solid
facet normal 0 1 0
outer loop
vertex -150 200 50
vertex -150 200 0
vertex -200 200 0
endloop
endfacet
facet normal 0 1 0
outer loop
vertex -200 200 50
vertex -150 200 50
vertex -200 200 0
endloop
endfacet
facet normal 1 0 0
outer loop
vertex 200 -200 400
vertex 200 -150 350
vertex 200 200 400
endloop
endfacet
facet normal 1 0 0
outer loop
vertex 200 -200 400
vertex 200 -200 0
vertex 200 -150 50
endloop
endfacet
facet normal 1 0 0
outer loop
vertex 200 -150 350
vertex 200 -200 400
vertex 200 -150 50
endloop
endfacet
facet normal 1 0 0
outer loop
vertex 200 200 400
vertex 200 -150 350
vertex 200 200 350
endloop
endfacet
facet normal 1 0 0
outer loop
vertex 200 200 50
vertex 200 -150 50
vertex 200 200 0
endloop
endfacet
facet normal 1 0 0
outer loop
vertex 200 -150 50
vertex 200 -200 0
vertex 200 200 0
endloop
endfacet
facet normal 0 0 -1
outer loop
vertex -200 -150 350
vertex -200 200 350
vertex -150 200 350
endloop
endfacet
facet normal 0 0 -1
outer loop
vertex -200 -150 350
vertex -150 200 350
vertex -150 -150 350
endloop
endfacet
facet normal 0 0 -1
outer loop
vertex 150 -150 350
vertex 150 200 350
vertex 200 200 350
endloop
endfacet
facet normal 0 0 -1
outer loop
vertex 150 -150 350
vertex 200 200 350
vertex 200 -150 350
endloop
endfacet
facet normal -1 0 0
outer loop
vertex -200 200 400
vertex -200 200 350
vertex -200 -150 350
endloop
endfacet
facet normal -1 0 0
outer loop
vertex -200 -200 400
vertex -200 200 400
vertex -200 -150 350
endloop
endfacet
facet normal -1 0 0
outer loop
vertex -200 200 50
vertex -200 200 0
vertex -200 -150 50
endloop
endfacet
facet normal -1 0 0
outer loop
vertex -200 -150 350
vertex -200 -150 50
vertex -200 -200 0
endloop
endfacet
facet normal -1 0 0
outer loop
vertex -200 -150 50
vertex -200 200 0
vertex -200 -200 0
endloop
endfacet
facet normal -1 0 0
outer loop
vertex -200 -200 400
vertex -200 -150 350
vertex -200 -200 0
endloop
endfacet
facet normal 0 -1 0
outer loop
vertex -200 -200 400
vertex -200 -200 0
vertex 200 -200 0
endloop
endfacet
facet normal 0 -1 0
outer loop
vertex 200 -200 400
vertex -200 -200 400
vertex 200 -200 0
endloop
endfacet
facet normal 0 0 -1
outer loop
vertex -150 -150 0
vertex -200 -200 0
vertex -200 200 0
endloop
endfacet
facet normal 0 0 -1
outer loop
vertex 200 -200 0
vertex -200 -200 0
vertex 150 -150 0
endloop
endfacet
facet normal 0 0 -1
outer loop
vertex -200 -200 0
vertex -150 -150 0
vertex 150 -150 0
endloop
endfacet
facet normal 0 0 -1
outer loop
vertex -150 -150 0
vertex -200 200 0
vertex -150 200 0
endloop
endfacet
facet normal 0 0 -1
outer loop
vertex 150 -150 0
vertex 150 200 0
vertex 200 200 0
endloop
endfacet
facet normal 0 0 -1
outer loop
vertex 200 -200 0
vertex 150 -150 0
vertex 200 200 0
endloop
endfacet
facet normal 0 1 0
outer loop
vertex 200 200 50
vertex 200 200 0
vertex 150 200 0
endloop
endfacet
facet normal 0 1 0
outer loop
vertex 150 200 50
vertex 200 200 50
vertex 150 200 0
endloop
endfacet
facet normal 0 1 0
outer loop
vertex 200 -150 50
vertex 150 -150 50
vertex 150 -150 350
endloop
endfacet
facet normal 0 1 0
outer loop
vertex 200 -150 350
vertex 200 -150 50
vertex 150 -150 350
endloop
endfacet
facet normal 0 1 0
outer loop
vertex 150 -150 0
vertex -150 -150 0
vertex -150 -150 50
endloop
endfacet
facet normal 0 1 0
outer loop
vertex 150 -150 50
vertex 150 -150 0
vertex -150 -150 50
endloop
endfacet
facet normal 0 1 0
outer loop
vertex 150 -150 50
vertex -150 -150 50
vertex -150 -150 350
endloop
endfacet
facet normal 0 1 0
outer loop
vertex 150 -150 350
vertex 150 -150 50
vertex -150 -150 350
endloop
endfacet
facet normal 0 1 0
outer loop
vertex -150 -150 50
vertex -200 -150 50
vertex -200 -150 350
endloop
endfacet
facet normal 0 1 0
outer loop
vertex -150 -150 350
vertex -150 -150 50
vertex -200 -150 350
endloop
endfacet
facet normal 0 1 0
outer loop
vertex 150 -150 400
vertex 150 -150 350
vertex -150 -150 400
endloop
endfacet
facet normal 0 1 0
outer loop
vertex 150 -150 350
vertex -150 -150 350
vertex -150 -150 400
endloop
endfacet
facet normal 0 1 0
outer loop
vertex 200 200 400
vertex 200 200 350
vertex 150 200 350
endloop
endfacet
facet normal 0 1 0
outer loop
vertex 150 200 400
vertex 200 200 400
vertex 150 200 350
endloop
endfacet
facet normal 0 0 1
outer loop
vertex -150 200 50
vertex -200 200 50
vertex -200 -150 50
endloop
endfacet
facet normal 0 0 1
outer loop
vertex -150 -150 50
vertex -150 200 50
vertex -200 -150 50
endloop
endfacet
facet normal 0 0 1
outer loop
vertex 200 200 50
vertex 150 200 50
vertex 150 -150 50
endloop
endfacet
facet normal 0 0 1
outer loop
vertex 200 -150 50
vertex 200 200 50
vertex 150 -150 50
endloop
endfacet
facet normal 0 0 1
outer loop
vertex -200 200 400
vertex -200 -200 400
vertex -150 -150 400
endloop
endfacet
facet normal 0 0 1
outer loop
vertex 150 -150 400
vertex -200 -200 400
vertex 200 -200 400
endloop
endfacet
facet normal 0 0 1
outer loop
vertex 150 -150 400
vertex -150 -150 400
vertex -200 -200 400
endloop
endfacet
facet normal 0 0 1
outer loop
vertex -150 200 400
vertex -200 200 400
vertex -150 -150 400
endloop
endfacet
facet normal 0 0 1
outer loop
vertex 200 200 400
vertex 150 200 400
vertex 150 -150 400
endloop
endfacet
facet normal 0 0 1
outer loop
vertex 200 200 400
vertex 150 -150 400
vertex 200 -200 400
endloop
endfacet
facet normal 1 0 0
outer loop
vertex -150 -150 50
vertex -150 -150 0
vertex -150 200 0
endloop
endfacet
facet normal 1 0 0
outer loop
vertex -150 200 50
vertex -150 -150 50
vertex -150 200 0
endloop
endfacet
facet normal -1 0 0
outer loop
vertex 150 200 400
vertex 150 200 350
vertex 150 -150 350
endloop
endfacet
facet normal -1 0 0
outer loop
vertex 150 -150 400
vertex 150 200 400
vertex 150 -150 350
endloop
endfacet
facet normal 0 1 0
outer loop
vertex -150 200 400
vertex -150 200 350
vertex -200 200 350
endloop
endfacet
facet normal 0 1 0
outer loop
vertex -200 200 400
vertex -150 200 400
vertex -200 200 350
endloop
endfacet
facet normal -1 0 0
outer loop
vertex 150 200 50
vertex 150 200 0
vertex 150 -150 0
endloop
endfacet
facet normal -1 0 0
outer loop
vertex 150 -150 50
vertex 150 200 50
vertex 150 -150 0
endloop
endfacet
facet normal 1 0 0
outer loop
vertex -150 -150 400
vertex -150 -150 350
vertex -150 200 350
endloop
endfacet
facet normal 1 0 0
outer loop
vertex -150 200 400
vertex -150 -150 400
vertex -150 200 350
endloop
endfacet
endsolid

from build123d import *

# Parameters (mm, degrees)
F1_DEPTH = 400
F2_W     = 350
F2_H     = 300
F3_DEPTH = 400.001


with BuildPart() as f1:
    # F0 (on Top) → F1 (new body)
    with BuildSketch(Plane.XY):
        Polygon((-200, -200), (200, -200), (200, 200), (150, 200), (150, -150), (-150, -150), (-150, 200), (-200, 200), align=None)
    extrude(amount=F1_DEPTH)

    # F2 (on face) → F3 (cut, through all)
    with BuildSketch(Plane(origin=(-200, 0, 0), x_dir=(0, -1, 0), z_dir=(-1, 0, 0))):
        with Locations((-25, 200)):
            Rectangle(F2_W, F2_H)
    extrude(amount=-F3_DEPTH, mode=Mode.SUBTRACT)


solid = f1.part
